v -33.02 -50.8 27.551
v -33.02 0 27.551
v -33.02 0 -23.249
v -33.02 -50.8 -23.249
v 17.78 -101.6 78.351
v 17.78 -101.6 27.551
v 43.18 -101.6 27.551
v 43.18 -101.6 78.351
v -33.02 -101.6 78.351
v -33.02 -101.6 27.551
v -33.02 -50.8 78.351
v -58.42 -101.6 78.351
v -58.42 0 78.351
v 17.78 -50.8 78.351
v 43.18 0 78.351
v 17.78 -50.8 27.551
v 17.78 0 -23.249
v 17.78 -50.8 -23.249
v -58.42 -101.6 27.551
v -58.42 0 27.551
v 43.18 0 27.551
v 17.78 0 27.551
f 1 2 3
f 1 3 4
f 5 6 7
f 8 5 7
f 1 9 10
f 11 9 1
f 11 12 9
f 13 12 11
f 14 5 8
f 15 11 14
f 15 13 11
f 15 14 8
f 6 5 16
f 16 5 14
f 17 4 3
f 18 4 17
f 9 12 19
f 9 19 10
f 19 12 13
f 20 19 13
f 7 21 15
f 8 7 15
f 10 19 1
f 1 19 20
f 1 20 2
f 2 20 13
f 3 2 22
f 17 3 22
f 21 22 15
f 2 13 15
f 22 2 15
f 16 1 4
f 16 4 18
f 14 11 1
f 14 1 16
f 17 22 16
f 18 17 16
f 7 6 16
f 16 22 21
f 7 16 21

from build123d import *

# Parameters (mm, degrees)
F0_W     = 101.6
F0_H     = 50.8
F1_DEPTH = 50.8
F2_W     = 25.4
F2_H     = 101.6
F3_DEPTH = 50.8
F4_W     = 50.800001
F4_H     = 50.8
F5_DEPTH = 50.8


with BuildPart() as f1:
    # F0 (on Front) → F1 (new body)
    with BuildSketch(Plane.XZ):
        with Locations((-7.620003, 52.950555)):
            Rectangle(F0_W, F0_H)
    extrude(amount=F1_DEPTH)

    # F2 (on face) → F3 (join)
    with BuildSketch(Plane.XY.offset(78.350555)):
        with Locations((-45.720003, -50.8)):
            Rectangle(F2_W, F2_H)
        with Locations((30.479997, -50.8)):
            Rectangle(F2_W, F2_H)
    extrude(amount=-F3_DEPTH)

    # F4 (on face) → F5 (join)
    with BuildSketch(Plane(origin=(0, 0, 27.550555), x_dir=(1, 0, 0), z_dir=(0, 0, -1))):
        with Locations((-7.620002, 25.4)):
            Rectangle(F4_W, F4_H)
    extrude(amount=F5_DEPTH)


solid = f1.part
